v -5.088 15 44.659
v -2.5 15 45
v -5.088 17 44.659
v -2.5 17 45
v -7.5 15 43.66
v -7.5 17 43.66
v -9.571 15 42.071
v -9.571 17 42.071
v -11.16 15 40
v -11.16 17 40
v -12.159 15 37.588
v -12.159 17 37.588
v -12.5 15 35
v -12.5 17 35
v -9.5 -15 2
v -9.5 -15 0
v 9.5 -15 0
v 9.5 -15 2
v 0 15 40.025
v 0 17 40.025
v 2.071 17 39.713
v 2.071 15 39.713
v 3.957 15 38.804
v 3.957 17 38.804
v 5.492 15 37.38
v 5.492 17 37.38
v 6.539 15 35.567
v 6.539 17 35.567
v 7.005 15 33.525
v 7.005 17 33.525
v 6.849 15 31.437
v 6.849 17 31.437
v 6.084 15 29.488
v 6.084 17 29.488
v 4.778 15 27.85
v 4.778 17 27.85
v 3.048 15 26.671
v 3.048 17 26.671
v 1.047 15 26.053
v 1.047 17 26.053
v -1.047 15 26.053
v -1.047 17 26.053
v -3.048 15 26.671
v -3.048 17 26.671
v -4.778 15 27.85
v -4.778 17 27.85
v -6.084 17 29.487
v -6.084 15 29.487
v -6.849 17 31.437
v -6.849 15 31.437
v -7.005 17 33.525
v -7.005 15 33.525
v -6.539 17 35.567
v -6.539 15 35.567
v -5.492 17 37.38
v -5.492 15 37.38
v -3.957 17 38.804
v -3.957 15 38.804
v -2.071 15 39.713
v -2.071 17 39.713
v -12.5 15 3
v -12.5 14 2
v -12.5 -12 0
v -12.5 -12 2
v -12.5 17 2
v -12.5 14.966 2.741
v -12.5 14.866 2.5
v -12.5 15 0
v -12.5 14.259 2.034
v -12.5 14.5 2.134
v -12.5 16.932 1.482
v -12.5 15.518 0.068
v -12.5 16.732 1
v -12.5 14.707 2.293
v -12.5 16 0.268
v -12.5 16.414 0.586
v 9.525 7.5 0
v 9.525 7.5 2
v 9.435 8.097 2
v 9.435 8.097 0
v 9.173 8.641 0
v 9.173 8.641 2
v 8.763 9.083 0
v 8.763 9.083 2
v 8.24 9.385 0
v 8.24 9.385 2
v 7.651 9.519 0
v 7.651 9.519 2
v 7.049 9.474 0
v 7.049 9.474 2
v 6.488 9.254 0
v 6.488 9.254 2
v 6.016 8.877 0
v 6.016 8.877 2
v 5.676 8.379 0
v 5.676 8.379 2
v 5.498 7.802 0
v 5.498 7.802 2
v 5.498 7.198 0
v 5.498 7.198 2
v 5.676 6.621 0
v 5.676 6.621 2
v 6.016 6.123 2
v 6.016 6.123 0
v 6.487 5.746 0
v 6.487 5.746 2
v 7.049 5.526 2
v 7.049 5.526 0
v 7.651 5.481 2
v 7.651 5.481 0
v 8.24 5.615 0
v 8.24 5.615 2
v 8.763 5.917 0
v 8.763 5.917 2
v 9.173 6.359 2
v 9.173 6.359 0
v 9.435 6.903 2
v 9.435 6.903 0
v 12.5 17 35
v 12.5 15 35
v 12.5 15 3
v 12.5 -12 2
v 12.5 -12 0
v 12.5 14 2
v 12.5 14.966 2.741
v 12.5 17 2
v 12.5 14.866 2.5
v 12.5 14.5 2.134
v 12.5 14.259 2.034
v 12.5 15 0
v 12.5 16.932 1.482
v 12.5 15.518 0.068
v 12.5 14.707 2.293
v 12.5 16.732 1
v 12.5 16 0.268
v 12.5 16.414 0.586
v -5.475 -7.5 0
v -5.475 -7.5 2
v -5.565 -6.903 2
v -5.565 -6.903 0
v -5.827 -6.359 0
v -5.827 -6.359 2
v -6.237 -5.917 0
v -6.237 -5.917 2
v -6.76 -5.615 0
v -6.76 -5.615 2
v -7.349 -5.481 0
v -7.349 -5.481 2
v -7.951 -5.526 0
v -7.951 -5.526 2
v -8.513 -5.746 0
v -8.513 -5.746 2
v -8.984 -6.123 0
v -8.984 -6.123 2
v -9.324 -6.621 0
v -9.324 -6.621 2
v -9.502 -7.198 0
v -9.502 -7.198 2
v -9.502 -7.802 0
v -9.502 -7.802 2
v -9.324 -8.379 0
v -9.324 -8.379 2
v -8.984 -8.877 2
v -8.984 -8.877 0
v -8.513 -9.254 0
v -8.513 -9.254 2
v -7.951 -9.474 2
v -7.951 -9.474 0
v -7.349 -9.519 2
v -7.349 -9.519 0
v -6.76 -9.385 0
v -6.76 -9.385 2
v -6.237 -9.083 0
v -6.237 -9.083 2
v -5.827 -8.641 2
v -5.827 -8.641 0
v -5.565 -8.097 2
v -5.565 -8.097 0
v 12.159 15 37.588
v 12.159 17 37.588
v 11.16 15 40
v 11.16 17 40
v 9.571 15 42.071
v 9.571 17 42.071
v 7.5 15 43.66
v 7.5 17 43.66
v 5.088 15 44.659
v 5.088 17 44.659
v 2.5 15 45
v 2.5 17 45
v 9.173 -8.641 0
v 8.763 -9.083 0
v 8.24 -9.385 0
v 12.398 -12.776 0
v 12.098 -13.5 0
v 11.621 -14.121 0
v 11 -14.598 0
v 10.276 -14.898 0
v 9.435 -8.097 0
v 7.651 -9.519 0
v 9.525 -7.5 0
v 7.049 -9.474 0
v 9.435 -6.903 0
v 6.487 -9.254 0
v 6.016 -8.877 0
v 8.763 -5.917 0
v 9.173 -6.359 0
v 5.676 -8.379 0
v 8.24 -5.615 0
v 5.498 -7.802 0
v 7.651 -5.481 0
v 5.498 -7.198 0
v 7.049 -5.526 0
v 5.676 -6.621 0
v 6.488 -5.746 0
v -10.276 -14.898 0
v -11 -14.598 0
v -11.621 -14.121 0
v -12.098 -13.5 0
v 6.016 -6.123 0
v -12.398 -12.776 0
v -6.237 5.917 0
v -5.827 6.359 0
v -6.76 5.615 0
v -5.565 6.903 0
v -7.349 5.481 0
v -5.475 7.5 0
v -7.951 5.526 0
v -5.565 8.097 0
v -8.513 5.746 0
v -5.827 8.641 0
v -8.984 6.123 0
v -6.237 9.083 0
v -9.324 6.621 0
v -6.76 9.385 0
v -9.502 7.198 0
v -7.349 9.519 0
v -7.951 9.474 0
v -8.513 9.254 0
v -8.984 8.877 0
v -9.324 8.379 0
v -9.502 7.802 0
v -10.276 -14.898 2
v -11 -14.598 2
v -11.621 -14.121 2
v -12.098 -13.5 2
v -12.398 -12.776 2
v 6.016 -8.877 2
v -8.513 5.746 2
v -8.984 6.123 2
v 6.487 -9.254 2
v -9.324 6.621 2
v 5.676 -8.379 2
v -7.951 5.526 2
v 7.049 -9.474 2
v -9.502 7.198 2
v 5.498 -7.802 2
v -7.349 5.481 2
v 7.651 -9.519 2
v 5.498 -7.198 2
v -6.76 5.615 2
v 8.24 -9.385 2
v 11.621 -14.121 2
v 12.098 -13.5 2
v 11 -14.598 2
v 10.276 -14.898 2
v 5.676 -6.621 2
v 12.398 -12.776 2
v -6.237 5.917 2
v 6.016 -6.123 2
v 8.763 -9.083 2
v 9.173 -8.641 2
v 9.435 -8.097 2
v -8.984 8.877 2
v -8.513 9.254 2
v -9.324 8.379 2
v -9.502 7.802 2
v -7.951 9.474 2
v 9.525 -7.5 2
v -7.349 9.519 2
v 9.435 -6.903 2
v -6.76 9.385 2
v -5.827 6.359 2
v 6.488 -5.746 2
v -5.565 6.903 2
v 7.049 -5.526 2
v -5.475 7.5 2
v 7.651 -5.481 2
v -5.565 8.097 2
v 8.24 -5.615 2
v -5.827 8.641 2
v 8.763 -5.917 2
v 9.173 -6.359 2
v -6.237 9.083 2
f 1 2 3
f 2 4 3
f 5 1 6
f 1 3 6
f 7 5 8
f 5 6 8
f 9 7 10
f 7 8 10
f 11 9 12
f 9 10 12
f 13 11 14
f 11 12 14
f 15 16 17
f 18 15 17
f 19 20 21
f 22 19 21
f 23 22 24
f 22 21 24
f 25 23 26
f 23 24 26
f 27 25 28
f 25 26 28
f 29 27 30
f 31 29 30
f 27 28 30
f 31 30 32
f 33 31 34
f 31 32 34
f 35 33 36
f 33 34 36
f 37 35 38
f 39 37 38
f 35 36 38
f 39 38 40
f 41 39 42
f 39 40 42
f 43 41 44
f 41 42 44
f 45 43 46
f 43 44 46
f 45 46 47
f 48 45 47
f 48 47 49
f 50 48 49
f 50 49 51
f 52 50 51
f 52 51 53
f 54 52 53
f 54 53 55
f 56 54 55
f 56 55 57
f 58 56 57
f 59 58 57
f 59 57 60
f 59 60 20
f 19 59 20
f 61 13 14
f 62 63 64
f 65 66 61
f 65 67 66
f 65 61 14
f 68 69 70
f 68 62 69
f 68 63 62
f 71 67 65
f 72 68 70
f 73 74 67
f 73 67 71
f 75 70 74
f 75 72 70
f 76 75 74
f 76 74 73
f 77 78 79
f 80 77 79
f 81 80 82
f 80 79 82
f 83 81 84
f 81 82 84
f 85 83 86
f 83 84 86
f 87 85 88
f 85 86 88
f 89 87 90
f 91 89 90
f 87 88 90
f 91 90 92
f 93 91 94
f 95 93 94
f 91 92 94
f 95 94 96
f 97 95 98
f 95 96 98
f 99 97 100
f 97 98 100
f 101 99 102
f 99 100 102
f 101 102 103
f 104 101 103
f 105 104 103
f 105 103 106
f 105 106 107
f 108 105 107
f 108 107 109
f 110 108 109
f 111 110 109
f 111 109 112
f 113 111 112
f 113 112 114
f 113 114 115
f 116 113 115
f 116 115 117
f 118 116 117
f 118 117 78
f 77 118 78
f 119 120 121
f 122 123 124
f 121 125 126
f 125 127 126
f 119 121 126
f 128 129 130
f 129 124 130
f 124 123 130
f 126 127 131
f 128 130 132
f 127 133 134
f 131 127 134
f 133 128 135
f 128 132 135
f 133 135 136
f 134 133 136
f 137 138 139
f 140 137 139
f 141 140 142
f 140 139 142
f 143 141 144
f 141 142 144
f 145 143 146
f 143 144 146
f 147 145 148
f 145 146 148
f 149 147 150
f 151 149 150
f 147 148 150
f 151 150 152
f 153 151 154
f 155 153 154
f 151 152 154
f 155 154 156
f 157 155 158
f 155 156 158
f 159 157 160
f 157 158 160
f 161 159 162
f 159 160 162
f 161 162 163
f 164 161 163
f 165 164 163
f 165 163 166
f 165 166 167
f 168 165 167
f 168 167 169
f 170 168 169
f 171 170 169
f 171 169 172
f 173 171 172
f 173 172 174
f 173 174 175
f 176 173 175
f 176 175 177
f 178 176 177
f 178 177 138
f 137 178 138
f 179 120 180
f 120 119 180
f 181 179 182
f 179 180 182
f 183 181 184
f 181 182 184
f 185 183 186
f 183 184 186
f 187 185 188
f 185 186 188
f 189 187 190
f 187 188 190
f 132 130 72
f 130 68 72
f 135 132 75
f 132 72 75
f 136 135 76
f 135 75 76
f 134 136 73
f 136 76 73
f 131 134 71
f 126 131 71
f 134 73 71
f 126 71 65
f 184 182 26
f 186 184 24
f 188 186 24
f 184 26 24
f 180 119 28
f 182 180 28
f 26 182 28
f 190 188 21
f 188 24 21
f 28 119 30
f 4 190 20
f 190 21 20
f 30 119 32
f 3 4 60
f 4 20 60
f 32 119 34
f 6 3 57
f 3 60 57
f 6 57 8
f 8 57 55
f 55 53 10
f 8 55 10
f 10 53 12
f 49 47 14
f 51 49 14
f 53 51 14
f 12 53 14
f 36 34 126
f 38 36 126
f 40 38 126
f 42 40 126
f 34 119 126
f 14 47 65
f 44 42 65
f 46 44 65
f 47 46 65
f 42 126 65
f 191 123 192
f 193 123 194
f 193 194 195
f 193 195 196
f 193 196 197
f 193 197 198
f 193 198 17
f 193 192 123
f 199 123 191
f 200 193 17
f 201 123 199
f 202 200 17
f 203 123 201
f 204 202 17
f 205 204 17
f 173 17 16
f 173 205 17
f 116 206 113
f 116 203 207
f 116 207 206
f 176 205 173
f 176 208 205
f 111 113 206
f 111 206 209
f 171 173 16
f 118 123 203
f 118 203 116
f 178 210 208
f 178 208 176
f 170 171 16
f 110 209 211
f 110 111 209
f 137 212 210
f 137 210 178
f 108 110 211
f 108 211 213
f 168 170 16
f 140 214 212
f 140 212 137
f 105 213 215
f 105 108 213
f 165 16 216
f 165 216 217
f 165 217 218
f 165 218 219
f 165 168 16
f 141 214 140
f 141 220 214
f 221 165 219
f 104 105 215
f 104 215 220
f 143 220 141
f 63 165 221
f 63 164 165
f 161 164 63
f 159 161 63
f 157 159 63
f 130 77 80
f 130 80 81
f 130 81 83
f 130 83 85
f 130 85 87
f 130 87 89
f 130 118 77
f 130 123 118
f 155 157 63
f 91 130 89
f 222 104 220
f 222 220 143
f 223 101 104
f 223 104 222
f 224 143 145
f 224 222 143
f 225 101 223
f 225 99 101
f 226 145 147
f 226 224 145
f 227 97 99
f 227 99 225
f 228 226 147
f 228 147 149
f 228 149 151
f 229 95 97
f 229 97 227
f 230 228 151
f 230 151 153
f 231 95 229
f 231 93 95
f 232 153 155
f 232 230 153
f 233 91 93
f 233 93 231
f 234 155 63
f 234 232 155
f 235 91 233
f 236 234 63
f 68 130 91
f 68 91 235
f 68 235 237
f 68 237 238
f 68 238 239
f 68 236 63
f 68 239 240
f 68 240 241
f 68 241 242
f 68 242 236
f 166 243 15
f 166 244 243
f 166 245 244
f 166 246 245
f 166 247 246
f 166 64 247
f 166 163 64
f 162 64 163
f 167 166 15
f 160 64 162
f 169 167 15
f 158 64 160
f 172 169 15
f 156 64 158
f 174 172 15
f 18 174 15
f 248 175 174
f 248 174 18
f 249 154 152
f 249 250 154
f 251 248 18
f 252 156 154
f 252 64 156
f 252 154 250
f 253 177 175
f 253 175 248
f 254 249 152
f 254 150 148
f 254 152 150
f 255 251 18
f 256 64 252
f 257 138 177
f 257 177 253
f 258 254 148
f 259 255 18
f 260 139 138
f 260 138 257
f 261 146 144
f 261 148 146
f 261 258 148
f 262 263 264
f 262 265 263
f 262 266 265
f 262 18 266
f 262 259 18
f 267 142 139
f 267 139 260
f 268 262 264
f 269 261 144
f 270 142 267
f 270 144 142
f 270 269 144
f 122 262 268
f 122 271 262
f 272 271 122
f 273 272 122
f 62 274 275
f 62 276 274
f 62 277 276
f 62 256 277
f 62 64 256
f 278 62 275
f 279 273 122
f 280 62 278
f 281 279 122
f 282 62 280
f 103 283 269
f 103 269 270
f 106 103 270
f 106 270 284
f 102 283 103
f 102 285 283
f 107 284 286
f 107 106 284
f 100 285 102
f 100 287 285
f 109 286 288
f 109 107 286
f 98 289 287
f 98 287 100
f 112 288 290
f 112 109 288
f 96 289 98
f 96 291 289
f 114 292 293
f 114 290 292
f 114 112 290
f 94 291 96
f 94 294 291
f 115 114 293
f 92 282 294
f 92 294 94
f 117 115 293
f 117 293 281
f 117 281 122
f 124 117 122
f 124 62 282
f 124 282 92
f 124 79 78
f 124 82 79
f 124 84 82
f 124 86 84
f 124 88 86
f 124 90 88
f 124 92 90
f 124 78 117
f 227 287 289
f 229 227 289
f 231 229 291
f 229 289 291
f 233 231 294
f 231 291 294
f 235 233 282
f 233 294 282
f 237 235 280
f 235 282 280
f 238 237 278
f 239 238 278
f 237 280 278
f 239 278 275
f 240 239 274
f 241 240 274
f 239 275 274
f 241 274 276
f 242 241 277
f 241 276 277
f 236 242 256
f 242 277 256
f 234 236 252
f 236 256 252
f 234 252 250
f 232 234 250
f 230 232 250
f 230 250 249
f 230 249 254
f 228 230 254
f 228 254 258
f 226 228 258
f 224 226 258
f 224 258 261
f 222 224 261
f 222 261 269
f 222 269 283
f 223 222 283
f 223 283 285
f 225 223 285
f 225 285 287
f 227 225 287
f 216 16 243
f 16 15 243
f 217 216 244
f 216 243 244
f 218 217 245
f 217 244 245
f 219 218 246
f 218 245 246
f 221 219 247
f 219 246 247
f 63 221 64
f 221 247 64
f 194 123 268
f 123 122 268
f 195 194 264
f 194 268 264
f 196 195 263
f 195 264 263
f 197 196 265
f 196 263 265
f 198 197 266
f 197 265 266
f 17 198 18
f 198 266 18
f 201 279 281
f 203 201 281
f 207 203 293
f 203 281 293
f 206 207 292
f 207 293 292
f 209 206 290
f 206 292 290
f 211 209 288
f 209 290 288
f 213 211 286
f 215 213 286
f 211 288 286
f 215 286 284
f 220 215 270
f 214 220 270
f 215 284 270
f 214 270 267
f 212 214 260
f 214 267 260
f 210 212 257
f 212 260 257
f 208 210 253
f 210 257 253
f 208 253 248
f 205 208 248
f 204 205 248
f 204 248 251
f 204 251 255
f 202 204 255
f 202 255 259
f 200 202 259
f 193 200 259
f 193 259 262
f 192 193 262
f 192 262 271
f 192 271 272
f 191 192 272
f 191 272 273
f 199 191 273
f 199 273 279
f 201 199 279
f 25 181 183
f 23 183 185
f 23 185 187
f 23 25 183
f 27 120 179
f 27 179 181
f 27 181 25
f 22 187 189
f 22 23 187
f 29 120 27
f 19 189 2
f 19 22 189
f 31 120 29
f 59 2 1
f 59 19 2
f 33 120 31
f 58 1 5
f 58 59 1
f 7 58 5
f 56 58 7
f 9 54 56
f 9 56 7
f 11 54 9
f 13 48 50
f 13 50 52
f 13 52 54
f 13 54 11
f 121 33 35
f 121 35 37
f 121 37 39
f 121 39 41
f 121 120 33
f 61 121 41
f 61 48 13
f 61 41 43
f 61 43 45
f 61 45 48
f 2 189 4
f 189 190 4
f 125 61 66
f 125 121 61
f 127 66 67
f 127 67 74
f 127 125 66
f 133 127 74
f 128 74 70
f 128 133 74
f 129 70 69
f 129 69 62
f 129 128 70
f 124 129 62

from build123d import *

# Parameters (mm, degrees)
SKETCH1_W           = 25
SKETCH1_H           = 30
BOSS_EXTRUDE1_DEPTH = 2
SKETCH2_R           = 2.025
CUT_EXTRUDE1_DEPTH  = 20.627786426
SKETCH3_W           = 25
SKETCH3_H           = 2
BOSS_EXTRUDE2_DEPTH = 45
FILLET1_R           = 2
FILLET2_R           = 1
SKETCH4_R           = 7.025
CUT_EXTRUDE2_DEPTH  = 57.61492736
FILLET6_R           = 10
FILLET7_R           = 3


with BuildPart() as part:
    # Sketch1 → Boss-Extrude1 (new body)
    with BuildSketch(Plane.XY):
        Rectangle(SKETCH1_W, SKETCH1_H)
    extrude(amount=BOSS_EXTRUDE1_DEPTH)

    # Sketch2 → Cut-Extrude1 (cut, through all)
    with BuildSketch(Plane.XY.offset(2)):
        with Locations((-7.5, 7.5)):
            Circle(SKETCH2_R)
        with Locations((7.5, 7.5)):
            Circle(SKETCH2_R)
        with Locations((7.5, -7.5)):
            Circle(SKETCH2_R)
        with Locations((-7.5, -7.5)):
            Circle(SKETCH2_R)
    extrude(amount=-CUT_EXTRUDE1_DEPTH, mode=Mode.SUBTRACT)

    # Sketch3 → Boss-Extrude2 (add)
    with BuildSketch(Plane(origin=(0, 0, 0), x_dir=(-1, 0, 0), z_dir=(0, 0, -1))):
        with Locations((0, 16)):
            Rectangle(SKETCH3_W, SKETCH3_H)
    extrude(amount=-BOSS_EXTRUDE2_DEPTH)

    # Fillet1
    fillet1_edges = [part.edges().sort_by_distance(p)[0] for p in [
        (0, 17, 0),
    ]]
    fillet(fillet1_edges, radius=FILLET1_R)

    # Fillet2
    fillet2_edges = [part.edges().sort_by_distance(p)[0] for p in [
        (0, 15, 2),
    ]]
    fillet(fillet2_edges, radius=FILLET2_R)

    # Sketch4 → Cut-Extrude2 (cut, through all)
    with BuildSketch(Plane(origin=(0, 17, 0), x_dir=(1, 0, 0), z_dir=(0, 1, 0))):
        with Locations(Location((0, -33, 0), (0, 0, 270))):
            Circle(SKETCH4_R)
    extrude(amount=-CUT_EXTRUDE2_DEPTH, mode=Mode.SUBTRACT)

    # Fillet6
    fillet6_edges = [part.edges().sort_by_distance(p)[0] for p in [
        (12.5, 16, 45),
        (-12.5, 16, 45),
    ]]
    fillet(fillet6_edges, radius=FILLET6_R)

    # Fillet7
    fillet7_edges = [part.edges().sort_by_distance(p)[0] for p in [
        (12.5, -15, 1),
        (-12.5, -15, 1),
    ]]
    fillet(fillet7_edges, radius=FILLET7_R)


solid = part.part
